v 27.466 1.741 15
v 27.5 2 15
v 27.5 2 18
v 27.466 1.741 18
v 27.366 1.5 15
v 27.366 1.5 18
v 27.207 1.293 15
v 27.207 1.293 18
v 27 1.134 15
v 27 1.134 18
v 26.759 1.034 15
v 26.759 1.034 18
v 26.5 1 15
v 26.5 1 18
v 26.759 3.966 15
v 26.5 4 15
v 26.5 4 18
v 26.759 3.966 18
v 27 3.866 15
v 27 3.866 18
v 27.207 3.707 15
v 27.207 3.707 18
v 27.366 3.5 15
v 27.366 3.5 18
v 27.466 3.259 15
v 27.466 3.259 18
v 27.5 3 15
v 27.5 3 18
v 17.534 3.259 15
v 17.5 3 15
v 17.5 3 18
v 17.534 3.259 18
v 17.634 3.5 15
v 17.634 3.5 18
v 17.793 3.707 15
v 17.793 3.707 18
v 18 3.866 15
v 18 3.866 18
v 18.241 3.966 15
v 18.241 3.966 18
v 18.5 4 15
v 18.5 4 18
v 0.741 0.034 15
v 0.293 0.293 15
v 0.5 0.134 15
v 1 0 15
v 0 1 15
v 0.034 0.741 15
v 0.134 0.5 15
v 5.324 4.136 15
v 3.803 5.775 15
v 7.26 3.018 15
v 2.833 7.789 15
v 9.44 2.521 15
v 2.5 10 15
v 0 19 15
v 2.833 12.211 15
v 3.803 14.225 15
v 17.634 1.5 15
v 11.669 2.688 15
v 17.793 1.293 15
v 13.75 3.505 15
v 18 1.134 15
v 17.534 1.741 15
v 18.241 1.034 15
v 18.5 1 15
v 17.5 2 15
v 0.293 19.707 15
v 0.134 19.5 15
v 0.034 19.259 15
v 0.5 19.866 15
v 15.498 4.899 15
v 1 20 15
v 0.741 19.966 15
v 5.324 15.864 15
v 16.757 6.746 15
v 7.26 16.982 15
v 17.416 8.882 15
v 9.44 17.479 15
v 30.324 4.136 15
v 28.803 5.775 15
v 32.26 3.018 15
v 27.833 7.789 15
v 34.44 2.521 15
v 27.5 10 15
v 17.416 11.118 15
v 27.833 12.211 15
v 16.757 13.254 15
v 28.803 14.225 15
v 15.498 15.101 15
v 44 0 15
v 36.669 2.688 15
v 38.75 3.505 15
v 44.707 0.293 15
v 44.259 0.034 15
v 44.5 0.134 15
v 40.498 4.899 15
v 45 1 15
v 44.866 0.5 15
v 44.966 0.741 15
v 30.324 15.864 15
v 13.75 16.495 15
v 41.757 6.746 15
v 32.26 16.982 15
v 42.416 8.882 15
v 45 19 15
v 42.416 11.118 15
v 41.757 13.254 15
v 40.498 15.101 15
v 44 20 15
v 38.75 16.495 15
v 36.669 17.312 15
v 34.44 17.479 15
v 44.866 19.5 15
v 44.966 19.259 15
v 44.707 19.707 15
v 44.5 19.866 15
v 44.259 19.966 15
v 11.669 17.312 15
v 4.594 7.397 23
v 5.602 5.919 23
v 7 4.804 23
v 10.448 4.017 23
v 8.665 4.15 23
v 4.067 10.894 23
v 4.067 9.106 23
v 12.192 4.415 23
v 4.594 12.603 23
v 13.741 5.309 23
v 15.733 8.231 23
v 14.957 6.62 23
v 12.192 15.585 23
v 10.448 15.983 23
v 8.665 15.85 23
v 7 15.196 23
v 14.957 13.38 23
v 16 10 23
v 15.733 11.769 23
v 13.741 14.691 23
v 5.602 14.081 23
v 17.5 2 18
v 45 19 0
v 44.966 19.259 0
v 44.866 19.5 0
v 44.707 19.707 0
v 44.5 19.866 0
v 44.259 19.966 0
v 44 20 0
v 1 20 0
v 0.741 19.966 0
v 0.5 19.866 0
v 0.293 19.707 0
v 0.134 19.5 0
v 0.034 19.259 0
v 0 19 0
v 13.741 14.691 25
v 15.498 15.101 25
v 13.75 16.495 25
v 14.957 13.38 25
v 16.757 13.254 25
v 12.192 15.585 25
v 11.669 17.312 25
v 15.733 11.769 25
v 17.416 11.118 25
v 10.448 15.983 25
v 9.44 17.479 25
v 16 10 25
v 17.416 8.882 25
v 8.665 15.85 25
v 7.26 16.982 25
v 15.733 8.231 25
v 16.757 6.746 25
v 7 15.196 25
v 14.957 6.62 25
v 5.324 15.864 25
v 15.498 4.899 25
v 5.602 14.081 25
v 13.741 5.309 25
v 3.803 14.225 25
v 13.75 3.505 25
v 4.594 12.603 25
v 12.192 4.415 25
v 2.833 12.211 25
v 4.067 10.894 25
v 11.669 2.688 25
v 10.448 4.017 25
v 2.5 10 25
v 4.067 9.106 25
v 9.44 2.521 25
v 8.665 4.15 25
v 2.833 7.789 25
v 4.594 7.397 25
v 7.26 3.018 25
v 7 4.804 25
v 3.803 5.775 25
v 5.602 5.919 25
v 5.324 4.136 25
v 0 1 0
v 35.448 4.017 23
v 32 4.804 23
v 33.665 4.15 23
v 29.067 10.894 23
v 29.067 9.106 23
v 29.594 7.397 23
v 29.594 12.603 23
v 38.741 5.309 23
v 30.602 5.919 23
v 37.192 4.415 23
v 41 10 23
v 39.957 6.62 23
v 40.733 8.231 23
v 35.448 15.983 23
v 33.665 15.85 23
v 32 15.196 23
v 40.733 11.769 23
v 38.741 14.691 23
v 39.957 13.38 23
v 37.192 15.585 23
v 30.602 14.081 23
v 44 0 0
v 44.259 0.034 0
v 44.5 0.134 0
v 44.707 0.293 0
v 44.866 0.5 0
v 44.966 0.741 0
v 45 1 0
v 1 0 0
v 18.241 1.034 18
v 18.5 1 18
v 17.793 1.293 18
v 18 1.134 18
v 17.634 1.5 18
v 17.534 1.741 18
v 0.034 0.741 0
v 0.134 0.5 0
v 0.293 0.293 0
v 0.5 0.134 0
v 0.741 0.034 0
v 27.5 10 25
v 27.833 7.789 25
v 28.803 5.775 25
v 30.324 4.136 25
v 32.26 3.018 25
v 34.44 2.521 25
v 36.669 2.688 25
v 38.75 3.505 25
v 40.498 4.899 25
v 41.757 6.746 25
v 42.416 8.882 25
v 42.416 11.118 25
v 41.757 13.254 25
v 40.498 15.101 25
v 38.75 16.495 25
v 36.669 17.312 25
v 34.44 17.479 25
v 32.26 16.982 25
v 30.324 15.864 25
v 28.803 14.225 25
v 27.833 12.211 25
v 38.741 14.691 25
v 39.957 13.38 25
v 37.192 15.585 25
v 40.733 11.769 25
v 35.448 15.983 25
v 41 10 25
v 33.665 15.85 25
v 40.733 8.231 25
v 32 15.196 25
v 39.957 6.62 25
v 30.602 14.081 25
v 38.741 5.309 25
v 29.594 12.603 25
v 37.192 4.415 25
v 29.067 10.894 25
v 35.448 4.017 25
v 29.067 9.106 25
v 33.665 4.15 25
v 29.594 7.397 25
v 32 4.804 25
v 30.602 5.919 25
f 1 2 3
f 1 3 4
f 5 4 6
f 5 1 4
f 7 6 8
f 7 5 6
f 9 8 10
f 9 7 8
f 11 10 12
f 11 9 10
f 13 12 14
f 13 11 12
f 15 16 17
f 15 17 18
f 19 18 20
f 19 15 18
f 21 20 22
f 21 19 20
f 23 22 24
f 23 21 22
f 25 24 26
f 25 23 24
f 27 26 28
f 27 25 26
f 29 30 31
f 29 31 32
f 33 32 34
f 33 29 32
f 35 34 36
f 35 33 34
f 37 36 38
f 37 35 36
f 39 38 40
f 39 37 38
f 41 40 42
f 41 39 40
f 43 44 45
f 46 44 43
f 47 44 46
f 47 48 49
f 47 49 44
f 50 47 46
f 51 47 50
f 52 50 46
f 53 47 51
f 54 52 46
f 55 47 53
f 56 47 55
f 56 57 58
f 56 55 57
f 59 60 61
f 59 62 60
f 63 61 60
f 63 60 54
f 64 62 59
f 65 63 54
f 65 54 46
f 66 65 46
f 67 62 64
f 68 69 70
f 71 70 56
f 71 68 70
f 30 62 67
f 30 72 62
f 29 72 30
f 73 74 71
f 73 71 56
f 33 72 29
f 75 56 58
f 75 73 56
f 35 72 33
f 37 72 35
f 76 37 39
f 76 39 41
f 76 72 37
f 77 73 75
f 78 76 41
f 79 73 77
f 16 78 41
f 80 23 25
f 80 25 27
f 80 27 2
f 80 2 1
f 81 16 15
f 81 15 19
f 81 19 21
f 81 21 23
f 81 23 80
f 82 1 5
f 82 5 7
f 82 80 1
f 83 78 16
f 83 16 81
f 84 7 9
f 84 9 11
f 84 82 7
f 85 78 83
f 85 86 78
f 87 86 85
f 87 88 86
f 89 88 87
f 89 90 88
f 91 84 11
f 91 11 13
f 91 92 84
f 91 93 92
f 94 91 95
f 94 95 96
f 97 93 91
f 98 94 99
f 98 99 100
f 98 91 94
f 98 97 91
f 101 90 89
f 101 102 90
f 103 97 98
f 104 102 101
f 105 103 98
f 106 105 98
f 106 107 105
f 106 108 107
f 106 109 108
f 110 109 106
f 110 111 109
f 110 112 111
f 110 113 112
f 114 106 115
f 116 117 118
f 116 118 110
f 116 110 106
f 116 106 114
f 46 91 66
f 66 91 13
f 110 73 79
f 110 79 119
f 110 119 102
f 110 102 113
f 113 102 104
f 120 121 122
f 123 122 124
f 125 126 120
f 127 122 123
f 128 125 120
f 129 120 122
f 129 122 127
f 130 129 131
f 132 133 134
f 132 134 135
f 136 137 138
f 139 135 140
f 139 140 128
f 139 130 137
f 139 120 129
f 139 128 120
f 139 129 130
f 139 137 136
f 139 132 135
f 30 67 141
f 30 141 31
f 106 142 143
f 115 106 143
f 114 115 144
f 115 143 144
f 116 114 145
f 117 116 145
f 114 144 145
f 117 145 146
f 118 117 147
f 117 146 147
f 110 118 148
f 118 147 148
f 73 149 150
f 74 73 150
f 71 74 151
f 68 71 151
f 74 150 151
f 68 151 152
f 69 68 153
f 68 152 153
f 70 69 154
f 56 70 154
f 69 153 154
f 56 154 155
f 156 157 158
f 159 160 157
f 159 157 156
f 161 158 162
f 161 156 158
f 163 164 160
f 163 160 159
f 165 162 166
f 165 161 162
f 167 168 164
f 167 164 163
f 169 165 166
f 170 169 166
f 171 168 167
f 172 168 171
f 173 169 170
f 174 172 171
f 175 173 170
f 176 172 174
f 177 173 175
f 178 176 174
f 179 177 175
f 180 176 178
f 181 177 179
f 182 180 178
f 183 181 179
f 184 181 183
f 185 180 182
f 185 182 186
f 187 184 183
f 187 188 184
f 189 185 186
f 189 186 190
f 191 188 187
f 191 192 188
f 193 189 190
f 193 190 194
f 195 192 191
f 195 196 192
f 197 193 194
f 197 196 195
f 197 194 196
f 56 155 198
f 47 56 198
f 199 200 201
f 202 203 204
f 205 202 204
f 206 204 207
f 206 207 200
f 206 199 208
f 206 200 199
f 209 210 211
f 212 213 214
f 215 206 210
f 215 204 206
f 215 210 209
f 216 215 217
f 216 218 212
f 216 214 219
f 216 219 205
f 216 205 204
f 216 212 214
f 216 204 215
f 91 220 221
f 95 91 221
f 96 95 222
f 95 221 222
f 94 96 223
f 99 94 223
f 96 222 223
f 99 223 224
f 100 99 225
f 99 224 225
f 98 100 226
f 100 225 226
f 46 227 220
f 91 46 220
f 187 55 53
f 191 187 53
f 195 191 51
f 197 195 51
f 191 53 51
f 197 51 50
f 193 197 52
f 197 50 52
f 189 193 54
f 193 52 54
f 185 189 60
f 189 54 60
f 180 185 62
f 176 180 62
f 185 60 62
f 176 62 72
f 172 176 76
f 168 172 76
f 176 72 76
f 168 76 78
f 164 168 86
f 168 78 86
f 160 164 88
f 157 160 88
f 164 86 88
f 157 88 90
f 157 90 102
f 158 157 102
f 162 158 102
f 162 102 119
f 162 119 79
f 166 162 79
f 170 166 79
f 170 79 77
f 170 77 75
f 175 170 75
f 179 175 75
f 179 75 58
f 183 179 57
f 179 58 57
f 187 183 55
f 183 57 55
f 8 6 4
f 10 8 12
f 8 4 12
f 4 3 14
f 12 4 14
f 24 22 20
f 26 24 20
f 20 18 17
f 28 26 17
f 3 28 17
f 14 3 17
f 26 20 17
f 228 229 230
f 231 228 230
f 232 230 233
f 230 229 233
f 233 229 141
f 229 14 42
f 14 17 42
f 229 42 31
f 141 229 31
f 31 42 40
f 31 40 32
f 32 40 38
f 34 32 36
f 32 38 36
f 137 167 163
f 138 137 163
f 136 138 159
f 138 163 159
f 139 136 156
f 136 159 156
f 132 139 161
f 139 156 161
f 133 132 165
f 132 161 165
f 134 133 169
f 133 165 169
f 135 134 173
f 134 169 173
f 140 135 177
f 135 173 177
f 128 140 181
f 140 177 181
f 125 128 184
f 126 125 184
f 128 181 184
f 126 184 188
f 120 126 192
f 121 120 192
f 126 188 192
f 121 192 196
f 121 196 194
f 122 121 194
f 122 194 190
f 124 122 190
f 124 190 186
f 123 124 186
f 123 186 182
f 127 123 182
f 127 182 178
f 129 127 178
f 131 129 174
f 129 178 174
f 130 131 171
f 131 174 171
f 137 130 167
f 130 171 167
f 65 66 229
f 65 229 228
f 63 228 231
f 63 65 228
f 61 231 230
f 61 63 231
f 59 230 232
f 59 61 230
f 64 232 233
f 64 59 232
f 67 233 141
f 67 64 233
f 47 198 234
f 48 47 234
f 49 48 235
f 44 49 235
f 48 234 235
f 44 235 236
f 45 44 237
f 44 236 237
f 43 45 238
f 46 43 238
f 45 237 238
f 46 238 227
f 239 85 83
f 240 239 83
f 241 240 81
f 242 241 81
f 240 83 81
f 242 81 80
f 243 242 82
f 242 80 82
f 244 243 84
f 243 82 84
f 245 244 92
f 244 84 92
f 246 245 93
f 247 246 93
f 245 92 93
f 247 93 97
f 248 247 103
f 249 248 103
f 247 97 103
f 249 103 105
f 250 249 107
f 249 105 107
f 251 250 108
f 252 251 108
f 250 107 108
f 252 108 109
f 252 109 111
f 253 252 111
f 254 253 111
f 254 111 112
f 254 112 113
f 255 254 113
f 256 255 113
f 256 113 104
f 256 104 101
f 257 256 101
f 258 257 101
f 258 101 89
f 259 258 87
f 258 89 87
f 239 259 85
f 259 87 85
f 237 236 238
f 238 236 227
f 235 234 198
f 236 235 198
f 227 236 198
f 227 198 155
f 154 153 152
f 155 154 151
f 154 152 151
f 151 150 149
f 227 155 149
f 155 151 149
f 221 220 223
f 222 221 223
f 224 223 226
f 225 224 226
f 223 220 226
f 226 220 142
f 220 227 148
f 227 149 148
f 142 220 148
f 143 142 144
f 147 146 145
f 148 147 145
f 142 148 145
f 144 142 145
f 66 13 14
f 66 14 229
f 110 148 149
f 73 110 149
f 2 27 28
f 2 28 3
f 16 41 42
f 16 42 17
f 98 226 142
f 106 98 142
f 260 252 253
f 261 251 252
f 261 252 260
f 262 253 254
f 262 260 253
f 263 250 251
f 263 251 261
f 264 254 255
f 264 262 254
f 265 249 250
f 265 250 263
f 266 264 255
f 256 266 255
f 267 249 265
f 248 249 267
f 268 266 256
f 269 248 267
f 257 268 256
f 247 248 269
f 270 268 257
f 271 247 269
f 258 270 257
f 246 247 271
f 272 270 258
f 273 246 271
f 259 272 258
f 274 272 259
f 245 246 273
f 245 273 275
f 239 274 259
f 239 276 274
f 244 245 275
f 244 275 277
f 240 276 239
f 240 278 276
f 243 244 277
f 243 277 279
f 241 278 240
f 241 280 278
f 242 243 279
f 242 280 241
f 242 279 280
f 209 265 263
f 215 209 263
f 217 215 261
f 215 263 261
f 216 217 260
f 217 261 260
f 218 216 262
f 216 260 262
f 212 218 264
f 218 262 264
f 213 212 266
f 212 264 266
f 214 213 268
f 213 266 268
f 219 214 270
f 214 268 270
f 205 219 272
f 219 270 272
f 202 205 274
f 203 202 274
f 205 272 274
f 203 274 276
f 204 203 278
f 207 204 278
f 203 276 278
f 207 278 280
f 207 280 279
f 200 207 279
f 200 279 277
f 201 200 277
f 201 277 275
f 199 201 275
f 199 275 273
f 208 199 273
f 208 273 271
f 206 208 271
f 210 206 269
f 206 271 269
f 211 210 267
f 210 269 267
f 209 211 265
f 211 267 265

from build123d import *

# Parameters (mm, degrees)
BOSS_EXTRUDE1_DEPTH = 15
SKETCH2_R           = 7.5
BOSS_EXTRUDE2_DEPTH = 10
SKETCH3_R           = 6
CUT_EXTRUDE1_DEPTH  = 2
BOSS_EXTRUDE3_DEPTH = 3


with BuildPart() as part:
    # Sketch1 → Boss-Extrude1 (new body)
    with BuildSketch(Plane.XY):
        with BuildLine():
            Line((1, 0), (44, 0))
            ThreePointArc((44, 0), (44.707106781, 0.292893219), (45, 1))
            Line((45, 1), (45, 19))
            ThreePointArc((45, 19), (44.707106781, 19.707106781), (44, 20))
            Line((44, 20), (1, 20))
            ThreePointArc((1, 20), (0.292893219, 19.707106781), (0, 19))
            Line((0, 19), (0, 1))
            ThreePointArc((0, 1), (0.292893219, 0.292893219), (1, 0))
        make_face()
    extrude(amount=BOSS_EXTRUDE1_DEPTH)

    # Sketch2 → Boss-Extrude2 (add)
    with BuildSketch(Plane.XY.offset(15)):
        with Locations(Location((10, 10, 0), (0, 0, 180))):
            Circle(SKETCH2_R)
        with Locations(Location((35, 10, 0), (0, 0, 180))):
            Circle(SKETCH2_R)
    extrude(amount=BOSS_EXTRUDE2_DEPTH)

    # Sketch3 → Cut-Extrude1 (cut)
    with BuildSketch(Plane.XY.offset(25)):
        with Locations((10, 10)):
            Circle(SKETCH3_R)
        with Locations((35, 10)):
            Circle(SKETCH3_R)
    extrude(amount=-CUT_EXTRUDE1_DEPTH, mode=Mode.SUBTRACT)

    # Sketch4 → Boss-Extrude3 (add)
    with BuildSketch(Plane.XY.offset(15)):
        with BuildLine():
            Line((18.5, 4), (26.5, 4))
            ThreePointArc((26.5, 4), (27.207106781, 3.707106781), (27.5, 3))
            Line((27.5, 3), (27.5, 2))
            ThreePointArc((27.5, 2), (27.207106781, 1.292893219), (26.5, 1))
            Line((26.5, 1), (18.5, 1))
            ThreePointArc((18.5, 1), (17.792893219, 1.292893219), (17.5, 2))
            Line((17.5, 2), (17.5, 3))
            ThreePointArc((17.5, 3), (17.792893219, 3.707106781), (18.5, 4))
        make_face()
    extrude(amount=BOSS_EXTRUDE3_DEPTH)


solid = part.part
